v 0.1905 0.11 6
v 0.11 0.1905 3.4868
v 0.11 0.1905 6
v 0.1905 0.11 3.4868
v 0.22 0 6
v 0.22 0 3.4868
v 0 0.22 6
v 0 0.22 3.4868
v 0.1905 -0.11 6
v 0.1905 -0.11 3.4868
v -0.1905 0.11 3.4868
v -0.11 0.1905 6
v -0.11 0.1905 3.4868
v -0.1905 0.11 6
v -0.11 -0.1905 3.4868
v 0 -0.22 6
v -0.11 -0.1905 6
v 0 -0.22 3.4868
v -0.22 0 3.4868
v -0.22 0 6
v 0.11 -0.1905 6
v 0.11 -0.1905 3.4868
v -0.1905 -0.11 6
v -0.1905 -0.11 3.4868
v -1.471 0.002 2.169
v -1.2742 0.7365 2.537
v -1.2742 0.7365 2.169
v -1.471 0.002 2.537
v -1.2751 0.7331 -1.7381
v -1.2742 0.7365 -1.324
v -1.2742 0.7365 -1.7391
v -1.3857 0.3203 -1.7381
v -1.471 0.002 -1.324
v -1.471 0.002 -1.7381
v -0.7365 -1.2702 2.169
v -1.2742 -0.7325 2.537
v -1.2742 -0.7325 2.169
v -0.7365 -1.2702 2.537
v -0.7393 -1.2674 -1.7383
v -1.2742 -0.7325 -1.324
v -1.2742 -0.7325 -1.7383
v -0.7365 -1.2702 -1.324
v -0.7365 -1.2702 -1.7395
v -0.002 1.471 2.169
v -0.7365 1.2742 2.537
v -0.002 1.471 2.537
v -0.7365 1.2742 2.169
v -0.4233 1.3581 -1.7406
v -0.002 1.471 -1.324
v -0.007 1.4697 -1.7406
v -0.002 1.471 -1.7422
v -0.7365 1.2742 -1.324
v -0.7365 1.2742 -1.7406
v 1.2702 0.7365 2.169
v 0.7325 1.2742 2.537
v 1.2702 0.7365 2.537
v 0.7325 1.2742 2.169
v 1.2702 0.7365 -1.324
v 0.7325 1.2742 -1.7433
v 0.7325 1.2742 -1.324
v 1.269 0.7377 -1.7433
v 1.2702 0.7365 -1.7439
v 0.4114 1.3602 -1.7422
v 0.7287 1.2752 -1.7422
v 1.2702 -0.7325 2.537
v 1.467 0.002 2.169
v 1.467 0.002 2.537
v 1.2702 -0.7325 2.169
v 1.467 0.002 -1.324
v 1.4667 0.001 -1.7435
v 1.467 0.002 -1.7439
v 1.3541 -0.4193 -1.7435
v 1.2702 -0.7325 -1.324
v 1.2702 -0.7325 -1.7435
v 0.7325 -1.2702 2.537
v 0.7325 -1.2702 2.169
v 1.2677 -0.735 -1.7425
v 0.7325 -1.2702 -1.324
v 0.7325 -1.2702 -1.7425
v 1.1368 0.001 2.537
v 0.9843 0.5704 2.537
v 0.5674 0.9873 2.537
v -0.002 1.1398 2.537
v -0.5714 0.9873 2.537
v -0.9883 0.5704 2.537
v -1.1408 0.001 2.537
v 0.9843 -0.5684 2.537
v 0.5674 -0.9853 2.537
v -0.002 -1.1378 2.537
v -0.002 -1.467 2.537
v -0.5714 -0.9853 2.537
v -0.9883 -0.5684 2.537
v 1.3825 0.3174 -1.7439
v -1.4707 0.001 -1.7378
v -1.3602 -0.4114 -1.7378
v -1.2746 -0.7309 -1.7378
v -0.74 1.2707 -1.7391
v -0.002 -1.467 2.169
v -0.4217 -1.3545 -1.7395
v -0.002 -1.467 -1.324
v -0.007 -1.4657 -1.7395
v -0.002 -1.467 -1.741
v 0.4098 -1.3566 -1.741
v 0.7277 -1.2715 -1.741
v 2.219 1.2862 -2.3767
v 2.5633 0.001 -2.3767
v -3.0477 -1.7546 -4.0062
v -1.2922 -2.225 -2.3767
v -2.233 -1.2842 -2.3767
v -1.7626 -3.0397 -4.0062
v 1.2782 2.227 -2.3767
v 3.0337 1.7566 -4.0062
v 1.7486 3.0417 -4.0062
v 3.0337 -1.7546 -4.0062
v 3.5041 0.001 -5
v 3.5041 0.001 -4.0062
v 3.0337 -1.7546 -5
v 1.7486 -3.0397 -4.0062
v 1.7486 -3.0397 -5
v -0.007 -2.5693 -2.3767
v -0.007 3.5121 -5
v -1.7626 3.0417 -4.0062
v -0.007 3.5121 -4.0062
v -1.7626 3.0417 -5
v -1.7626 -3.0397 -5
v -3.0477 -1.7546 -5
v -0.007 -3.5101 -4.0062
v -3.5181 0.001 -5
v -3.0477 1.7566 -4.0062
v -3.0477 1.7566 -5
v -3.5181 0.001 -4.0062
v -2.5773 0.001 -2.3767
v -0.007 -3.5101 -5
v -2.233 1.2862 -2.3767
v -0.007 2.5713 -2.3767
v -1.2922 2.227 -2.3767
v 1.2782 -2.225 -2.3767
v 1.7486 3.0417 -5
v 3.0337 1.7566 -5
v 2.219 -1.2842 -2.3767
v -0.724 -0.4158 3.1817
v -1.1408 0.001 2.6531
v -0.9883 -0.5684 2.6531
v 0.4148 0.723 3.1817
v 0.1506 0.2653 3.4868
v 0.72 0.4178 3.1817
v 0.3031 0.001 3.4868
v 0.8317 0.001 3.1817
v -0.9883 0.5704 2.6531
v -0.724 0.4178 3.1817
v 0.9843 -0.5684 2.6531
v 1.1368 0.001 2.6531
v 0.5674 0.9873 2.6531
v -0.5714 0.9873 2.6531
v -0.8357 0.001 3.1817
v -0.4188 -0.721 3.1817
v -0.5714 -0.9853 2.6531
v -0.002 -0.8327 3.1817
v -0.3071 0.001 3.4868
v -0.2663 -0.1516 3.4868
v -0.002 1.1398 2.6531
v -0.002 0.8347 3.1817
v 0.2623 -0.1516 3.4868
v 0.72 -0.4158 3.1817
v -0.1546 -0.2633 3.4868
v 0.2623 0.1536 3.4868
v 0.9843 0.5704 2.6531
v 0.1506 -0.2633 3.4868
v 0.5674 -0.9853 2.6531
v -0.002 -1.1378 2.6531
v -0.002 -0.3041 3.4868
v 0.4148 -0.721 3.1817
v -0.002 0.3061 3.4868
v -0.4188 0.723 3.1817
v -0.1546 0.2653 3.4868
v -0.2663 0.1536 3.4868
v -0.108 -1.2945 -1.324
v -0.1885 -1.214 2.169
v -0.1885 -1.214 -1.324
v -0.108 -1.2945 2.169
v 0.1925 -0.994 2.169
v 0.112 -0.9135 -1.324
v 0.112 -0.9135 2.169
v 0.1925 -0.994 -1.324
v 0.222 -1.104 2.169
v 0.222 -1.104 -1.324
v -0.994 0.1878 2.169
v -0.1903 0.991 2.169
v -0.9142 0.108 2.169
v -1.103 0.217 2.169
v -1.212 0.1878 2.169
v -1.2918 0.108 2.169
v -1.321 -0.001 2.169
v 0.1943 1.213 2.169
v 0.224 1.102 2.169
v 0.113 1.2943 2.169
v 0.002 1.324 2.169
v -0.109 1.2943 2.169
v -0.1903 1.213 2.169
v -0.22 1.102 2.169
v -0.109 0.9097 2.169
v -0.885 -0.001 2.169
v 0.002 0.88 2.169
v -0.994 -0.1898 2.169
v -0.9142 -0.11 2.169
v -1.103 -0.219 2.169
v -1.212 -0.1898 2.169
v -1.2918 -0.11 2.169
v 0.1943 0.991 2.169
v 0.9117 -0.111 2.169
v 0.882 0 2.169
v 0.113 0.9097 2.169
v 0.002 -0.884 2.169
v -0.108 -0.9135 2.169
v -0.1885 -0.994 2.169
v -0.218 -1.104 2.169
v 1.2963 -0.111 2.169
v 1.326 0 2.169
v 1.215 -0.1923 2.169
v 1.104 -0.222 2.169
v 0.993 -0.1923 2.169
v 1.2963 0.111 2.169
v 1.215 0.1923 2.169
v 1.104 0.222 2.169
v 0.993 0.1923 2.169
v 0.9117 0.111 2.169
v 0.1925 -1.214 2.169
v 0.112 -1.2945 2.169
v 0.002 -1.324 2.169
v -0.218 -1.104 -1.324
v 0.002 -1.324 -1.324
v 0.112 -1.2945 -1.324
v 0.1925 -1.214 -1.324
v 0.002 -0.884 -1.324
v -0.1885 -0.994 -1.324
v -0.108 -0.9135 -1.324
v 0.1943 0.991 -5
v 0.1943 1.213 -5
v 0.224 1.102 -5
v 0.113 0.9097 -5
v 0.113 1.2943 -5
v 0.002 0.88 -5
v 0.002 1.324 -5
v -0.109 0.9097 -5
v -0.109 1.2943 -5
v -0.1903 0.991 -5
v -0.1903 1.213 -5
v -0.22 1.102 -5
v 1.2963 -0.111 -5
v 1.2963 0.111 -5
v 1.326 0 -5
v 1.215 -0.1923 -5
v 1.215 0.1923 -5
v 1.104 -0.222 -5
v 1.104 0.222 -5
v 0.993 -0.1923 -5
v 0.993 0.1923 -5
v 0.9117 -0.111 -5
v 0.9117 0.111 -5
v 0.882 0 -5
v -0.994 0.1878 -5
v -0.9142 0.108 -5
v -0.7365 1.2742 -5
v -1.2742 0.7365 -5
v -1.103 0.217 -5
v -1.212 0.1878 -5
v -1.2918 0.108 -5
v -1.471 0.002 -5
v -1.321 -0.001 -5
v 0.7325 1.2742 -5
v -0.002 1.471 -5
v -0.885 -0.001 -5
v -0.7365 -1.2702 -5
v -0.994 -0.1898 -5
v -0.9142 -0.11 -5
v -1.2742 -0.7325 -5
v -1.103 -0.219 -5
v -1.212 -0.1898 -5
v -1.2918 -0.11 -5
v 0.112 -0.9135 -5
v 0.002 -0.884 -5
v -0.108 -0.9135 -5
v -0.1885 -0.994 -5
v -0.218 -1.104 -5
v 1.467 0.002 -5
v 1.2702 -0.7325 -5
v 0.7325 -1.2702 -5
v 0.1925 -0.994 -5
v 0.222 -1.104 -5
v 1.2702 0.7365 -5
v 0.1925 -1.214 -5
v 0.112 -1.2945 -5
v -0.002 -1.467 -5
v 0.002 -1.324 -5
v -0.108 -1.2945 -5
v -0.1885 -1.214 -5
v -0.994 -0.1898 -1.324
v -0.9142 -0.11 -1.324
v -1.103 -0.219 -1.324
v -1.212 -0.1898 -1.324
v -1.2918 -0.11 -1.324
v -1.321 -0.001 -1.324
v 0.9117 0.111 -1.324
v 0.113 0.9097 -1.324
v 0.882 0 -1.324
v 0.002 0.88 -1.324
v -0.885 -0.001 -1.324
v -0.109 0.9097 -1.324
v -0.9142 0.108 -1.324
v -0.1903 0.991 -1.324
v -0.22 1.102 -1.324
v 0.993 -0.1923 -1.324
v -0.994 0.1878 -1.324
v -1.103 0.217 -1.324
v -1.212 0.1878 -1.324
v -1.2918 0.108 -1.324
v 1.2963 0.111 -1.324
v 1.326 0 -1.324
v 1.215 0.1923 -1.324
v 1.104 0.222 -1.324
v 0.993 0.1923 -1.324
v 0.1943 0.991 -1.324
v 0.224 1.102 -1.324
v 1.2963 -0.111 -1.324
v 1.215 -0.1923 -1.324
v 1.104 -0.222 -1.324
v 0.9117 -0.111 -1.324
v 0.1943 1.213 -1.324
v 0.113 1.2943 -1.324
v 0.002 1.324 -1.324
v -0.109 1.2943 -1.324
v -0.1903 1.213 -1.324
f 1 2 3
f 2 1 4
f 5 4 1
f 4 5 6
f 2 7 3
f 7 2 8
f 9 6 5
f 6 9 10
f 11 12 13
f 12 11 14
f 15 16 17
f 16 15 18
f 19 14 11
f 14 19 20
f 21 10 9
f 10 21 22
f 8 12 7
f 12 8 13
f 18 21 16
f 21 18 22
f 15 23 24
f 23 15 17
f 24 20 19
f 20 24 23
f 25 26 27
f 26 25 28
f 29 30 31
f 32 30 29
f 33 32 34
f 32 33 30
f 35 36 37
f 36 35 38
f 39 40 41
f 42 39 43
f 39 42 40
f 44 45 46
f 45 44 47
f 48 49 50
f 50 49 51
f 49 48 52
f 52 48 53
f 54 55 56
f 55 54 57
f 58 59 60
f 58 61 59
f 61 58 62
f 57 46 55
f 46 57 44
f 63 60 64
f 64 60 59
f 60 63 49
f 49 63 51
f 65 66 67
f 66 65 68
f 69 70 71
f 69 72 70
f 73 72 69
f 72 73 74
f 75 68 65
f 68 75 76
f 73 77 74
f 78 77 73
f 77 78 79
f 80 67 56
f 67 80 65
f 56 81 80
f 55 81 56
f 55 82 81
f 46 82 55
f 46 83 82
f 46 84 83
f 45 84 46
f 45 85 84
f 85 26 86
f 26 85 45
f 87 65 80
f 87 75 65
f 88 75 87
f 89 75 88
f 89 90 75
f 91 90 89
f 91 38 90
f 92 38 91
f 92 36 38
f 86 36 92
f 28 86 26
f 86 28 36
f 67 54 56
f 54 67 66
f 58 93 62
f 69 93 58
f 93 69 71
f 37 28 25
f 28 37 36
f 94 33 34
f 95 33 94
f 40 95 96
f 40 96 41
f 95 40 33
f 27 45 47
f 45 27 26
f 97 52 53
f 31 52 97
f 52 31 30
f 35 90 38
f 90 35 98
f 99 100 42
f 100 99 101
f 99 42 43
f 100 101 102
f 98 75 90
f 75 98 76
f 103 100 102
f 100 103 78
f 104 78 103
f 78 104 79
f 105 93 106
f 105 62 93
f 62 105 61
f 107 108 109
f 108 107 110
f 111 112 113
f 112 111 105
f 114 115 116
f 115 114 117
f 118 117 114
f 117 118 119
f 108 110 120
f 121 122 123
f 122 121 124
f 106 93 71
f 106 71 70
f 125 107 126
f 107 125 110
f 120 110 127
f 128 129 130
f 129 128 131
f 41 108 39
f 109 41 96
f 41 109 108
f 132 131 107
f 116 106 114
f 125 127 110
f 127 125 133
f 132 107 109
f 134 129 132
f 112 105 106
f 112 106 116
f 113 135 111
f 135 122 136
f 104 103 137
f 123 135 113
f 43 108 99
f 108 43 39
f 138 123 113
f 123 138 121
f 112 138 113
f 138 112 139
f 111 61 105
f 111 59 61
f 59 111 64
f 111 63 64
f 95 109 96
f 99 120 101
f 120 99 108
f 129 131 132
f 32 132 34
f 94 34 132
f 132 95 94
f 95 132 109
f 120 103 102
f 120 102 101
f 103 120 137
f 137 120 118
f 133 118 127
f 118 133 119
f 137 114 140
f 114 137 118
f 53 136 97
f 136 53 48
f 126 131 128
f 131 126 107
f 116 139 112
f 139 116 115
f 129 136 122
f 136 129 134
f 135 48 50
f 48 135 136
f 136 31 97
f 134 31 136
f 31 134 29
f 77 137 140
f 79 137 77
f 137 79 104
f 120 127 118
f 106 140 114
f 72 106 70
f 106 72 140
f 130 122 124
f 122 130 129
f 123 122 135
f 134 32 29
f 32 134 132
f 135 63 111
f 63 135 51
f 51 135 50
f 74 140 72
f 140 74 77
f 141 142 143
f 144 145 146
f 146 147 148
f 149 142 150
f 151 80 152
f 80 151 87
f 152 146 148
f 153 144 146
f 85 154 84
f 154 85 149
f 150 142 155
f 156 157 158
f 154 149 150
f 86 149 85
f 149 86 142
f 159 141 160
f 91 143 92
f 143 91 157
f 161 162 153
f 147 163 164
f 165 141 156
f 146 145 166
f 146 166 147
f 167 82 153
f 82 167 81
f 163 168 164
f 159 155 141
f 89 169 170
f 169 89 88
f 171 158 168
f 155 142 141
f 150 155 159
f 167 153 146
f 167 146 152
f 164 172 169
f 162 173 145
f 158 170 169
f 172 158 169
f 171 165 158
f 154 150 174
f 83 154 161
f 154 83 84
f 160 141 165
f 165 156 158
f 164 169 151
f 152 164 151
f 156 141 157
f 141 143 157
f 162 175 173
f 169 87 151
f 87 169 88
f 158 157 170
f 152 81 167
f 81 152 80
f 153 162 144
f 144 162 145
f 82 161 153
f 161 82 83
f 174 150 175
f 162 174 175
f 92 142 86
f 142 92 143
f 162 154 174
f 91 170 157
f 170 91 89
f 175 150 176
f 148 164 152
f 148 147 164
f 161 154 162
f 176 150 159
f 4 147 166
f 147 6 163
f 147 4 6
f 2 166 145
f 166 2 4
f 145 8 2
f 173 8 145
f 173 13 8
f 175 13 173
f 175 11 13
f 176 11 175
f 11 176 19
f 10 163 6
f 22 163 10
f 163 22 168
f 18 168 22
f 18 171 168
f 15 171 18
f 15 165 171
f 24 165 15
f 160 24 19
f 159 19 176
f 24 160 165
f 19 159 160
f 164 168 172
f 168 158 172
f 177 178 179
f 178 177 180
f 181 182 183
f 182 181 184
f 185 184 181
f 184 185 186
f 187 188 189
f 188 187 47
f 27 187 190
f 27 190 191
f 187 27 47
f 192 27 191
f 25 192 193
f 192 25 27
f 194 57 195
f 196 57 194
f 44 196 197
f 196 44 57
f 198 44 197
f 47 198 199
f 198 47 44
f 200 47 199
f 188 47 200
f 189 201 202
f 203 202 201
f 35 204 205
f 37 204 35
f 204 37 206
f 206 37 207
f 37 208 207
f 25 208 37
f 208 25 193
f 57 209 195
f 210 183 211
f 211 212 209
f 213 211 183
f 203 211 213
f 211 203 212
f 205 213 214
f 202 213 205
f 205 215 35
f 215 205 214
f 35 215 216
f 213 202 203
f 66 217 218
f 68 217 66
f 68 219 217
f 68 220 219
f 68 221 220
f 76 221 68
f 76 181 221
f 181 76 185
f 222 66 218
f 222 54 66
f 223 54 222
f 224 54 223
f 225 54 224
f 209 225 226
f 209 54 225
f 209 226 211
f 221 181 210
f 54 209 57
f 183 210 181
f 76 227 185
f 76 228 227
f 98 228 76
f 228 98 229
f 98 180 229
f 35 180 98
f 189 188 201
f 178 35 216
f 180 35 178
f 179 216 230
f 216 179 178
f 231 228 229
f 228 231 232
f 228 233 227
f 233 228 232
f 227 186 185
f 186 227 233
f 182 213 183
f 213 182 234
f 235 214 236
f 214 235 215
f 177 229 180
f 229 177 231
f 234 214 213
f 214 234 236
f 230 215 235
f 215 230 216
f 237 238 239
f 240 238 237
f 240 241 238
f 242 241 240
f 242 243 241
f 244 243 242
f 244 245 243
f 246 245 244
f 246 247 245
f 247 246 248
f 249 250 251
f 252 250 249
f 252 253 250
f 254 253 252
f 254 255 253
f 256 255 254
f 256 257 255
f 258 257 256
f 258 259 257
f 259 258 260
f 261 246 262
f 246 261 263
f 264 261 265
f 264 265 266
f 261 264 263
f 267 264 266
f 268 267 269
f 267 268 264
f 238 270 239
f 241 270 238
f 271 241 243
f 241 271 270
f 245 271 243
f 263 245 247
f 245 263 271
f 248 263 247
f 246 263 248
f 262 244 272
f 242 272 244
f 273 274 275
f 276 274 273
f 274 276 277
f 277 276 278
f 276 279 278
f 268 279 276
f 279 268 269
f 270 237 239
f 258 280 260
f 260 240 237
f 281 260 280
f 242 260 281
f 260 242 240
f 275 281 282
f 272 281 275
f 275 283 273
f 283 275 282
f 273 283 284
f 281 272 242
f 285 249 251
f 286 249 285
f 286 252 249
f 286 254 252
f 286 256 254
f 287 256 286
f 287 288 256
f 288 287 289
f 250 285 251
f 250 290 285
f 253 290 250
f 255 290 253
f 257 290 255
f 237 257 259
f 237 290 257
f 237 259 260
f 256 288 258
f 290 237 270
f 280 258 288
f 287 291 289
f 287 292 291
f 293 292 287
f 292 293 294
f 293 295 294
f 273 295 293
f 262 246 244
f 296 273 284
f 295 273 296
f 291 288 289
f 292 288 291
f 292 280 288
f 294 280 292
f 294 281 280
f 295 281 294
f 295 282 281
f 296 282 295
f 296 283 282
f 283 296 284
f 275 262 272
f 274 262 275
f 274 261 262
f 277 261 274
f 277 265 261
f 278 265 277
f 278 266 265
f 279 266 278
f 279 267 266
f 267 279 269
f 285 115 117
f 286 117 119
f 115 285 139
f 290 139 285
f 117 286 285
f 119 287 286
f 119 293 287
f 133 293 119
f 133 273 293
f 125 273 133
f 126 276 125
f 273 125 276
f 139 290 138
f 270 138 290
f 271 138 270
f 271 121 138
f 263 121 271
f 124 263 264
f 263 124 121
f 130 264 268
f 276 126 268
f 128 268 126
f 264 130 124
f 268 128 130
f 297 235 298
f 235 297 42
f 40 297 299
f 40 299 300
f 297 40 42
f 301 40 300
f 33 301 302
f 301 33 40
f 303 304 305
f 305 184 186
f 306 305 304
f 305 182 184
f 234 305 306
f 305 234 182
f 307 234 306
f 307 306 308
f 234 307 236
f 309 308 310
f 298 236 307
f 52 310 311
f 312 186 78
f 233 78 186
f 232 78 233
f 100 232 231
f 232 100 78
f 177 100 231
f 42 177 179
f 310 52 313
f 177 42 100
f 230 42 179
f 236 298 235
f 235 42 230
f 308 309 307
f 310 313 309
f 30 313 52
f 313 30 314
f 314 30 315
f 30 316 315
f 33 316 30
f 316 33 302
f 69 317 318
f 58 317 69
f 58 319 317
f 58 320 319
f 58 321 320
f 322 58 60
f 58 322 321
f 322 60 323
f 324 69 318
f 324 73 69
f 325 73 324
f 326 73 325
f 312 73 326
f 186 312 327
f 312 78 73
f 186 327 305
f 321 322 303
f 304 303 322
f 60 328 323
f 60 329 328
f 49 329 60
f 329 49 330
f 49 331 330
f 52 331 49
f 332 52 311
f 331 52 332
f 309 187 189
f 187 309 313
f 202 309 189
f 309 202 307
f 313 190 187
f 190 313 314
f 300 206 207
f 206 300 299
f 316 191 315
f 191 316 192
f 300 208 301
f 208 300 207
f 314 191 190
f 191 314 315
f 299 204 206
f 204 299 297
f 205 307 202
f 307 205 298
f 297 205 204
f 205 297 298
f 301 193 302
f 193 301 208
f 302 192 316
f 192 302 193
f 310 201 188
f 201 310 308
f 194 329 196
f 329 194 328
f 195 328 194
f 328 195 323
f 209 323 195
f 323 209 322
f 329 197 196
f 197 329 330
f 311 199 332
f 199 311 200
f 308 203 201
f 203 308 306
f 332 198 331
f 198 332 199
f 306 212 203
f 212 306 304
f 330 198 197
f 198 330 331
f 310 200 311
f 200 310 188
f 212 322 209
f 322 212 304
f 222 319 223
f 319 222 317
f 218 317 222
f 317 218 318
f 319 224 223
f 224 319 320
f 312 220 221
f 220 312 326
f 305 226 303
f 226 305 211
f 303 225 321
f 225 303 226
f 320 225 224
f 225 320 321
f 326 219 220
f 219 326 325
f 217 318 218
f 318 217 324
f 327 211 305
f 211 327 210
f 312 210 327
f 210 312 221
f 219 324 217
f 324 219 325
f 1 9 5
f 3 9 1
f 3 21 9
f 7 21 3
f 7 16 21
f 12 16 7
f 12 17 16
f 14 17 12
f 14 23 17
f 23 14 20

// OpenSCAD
intersection() {
union() {
translate([0.002, 1.102, -5])
cylinder(h = 7.169, r1 = 0.222, r2 = 0.222, center = false, $fn = 12);
intersection() {
union() {
rotate([180, 0, 180])
translate([0.002, 0.002, -2.537])
cylinder(h = 20.737, r1 = 1.469, r2 = 1.469, center = false, $fn = 12);
translate([-0.007, 0.001, -4.947]) sphere(r = 3.635, $fn = 12);
intersection() {
translate([0, 0, -1.324])
cylinder(h = 19.524, r1 = 0.22, r2 = 0.22, center = false, $fn = 12);
translate([0, 0, 0]) sphere(r = 54.6, $fn = 12);
}
translate([-0.002, 0.001, 2.348]) sphere(r = 1.179, $fn = 12);
}
union() {
intersection() {
translate([0.002, -1.104, -5])
cylinder(h = 7.169, r1 = 0.22, r2 = 0.22, center = false, $fn = 12);
translate([0, 0, 0]) sphere(r = 54.6, $fn = 12);
}
translate([-1.103, -0.001, -5])
cylinder(h = 7.169, r1 = 0.218, r2 = 0.218, center = false, $fn = 12);
difference() {
union() {
rotate([180, 0, 180])
translate([0.002, 0.002, -18.2])
cylinder(h = 16.031, r1 = 1.469, r2 = 1.469, center = false, $fn = 12);
translate([-18.2, -18.2, -5]) cube(size = [36.4, 36.4, 3.676], center = false);
}
rotate([180, 0, 180])
translate([0.002, 0.002, 5])
cylinder(h = 13.2, r1 = 1.469, r2 = 1.469, center = false, $fn = 12);
}
}
}
translate([1.104, 0, -5])
cylinder(h = 7.537, r1 = 0.222, r2 = 0.222, center = false, $fn = 12);
}
translate([-4.406, -4.406, -6]) cube(size = [8.811, 8.811, 12], center = false);
}
